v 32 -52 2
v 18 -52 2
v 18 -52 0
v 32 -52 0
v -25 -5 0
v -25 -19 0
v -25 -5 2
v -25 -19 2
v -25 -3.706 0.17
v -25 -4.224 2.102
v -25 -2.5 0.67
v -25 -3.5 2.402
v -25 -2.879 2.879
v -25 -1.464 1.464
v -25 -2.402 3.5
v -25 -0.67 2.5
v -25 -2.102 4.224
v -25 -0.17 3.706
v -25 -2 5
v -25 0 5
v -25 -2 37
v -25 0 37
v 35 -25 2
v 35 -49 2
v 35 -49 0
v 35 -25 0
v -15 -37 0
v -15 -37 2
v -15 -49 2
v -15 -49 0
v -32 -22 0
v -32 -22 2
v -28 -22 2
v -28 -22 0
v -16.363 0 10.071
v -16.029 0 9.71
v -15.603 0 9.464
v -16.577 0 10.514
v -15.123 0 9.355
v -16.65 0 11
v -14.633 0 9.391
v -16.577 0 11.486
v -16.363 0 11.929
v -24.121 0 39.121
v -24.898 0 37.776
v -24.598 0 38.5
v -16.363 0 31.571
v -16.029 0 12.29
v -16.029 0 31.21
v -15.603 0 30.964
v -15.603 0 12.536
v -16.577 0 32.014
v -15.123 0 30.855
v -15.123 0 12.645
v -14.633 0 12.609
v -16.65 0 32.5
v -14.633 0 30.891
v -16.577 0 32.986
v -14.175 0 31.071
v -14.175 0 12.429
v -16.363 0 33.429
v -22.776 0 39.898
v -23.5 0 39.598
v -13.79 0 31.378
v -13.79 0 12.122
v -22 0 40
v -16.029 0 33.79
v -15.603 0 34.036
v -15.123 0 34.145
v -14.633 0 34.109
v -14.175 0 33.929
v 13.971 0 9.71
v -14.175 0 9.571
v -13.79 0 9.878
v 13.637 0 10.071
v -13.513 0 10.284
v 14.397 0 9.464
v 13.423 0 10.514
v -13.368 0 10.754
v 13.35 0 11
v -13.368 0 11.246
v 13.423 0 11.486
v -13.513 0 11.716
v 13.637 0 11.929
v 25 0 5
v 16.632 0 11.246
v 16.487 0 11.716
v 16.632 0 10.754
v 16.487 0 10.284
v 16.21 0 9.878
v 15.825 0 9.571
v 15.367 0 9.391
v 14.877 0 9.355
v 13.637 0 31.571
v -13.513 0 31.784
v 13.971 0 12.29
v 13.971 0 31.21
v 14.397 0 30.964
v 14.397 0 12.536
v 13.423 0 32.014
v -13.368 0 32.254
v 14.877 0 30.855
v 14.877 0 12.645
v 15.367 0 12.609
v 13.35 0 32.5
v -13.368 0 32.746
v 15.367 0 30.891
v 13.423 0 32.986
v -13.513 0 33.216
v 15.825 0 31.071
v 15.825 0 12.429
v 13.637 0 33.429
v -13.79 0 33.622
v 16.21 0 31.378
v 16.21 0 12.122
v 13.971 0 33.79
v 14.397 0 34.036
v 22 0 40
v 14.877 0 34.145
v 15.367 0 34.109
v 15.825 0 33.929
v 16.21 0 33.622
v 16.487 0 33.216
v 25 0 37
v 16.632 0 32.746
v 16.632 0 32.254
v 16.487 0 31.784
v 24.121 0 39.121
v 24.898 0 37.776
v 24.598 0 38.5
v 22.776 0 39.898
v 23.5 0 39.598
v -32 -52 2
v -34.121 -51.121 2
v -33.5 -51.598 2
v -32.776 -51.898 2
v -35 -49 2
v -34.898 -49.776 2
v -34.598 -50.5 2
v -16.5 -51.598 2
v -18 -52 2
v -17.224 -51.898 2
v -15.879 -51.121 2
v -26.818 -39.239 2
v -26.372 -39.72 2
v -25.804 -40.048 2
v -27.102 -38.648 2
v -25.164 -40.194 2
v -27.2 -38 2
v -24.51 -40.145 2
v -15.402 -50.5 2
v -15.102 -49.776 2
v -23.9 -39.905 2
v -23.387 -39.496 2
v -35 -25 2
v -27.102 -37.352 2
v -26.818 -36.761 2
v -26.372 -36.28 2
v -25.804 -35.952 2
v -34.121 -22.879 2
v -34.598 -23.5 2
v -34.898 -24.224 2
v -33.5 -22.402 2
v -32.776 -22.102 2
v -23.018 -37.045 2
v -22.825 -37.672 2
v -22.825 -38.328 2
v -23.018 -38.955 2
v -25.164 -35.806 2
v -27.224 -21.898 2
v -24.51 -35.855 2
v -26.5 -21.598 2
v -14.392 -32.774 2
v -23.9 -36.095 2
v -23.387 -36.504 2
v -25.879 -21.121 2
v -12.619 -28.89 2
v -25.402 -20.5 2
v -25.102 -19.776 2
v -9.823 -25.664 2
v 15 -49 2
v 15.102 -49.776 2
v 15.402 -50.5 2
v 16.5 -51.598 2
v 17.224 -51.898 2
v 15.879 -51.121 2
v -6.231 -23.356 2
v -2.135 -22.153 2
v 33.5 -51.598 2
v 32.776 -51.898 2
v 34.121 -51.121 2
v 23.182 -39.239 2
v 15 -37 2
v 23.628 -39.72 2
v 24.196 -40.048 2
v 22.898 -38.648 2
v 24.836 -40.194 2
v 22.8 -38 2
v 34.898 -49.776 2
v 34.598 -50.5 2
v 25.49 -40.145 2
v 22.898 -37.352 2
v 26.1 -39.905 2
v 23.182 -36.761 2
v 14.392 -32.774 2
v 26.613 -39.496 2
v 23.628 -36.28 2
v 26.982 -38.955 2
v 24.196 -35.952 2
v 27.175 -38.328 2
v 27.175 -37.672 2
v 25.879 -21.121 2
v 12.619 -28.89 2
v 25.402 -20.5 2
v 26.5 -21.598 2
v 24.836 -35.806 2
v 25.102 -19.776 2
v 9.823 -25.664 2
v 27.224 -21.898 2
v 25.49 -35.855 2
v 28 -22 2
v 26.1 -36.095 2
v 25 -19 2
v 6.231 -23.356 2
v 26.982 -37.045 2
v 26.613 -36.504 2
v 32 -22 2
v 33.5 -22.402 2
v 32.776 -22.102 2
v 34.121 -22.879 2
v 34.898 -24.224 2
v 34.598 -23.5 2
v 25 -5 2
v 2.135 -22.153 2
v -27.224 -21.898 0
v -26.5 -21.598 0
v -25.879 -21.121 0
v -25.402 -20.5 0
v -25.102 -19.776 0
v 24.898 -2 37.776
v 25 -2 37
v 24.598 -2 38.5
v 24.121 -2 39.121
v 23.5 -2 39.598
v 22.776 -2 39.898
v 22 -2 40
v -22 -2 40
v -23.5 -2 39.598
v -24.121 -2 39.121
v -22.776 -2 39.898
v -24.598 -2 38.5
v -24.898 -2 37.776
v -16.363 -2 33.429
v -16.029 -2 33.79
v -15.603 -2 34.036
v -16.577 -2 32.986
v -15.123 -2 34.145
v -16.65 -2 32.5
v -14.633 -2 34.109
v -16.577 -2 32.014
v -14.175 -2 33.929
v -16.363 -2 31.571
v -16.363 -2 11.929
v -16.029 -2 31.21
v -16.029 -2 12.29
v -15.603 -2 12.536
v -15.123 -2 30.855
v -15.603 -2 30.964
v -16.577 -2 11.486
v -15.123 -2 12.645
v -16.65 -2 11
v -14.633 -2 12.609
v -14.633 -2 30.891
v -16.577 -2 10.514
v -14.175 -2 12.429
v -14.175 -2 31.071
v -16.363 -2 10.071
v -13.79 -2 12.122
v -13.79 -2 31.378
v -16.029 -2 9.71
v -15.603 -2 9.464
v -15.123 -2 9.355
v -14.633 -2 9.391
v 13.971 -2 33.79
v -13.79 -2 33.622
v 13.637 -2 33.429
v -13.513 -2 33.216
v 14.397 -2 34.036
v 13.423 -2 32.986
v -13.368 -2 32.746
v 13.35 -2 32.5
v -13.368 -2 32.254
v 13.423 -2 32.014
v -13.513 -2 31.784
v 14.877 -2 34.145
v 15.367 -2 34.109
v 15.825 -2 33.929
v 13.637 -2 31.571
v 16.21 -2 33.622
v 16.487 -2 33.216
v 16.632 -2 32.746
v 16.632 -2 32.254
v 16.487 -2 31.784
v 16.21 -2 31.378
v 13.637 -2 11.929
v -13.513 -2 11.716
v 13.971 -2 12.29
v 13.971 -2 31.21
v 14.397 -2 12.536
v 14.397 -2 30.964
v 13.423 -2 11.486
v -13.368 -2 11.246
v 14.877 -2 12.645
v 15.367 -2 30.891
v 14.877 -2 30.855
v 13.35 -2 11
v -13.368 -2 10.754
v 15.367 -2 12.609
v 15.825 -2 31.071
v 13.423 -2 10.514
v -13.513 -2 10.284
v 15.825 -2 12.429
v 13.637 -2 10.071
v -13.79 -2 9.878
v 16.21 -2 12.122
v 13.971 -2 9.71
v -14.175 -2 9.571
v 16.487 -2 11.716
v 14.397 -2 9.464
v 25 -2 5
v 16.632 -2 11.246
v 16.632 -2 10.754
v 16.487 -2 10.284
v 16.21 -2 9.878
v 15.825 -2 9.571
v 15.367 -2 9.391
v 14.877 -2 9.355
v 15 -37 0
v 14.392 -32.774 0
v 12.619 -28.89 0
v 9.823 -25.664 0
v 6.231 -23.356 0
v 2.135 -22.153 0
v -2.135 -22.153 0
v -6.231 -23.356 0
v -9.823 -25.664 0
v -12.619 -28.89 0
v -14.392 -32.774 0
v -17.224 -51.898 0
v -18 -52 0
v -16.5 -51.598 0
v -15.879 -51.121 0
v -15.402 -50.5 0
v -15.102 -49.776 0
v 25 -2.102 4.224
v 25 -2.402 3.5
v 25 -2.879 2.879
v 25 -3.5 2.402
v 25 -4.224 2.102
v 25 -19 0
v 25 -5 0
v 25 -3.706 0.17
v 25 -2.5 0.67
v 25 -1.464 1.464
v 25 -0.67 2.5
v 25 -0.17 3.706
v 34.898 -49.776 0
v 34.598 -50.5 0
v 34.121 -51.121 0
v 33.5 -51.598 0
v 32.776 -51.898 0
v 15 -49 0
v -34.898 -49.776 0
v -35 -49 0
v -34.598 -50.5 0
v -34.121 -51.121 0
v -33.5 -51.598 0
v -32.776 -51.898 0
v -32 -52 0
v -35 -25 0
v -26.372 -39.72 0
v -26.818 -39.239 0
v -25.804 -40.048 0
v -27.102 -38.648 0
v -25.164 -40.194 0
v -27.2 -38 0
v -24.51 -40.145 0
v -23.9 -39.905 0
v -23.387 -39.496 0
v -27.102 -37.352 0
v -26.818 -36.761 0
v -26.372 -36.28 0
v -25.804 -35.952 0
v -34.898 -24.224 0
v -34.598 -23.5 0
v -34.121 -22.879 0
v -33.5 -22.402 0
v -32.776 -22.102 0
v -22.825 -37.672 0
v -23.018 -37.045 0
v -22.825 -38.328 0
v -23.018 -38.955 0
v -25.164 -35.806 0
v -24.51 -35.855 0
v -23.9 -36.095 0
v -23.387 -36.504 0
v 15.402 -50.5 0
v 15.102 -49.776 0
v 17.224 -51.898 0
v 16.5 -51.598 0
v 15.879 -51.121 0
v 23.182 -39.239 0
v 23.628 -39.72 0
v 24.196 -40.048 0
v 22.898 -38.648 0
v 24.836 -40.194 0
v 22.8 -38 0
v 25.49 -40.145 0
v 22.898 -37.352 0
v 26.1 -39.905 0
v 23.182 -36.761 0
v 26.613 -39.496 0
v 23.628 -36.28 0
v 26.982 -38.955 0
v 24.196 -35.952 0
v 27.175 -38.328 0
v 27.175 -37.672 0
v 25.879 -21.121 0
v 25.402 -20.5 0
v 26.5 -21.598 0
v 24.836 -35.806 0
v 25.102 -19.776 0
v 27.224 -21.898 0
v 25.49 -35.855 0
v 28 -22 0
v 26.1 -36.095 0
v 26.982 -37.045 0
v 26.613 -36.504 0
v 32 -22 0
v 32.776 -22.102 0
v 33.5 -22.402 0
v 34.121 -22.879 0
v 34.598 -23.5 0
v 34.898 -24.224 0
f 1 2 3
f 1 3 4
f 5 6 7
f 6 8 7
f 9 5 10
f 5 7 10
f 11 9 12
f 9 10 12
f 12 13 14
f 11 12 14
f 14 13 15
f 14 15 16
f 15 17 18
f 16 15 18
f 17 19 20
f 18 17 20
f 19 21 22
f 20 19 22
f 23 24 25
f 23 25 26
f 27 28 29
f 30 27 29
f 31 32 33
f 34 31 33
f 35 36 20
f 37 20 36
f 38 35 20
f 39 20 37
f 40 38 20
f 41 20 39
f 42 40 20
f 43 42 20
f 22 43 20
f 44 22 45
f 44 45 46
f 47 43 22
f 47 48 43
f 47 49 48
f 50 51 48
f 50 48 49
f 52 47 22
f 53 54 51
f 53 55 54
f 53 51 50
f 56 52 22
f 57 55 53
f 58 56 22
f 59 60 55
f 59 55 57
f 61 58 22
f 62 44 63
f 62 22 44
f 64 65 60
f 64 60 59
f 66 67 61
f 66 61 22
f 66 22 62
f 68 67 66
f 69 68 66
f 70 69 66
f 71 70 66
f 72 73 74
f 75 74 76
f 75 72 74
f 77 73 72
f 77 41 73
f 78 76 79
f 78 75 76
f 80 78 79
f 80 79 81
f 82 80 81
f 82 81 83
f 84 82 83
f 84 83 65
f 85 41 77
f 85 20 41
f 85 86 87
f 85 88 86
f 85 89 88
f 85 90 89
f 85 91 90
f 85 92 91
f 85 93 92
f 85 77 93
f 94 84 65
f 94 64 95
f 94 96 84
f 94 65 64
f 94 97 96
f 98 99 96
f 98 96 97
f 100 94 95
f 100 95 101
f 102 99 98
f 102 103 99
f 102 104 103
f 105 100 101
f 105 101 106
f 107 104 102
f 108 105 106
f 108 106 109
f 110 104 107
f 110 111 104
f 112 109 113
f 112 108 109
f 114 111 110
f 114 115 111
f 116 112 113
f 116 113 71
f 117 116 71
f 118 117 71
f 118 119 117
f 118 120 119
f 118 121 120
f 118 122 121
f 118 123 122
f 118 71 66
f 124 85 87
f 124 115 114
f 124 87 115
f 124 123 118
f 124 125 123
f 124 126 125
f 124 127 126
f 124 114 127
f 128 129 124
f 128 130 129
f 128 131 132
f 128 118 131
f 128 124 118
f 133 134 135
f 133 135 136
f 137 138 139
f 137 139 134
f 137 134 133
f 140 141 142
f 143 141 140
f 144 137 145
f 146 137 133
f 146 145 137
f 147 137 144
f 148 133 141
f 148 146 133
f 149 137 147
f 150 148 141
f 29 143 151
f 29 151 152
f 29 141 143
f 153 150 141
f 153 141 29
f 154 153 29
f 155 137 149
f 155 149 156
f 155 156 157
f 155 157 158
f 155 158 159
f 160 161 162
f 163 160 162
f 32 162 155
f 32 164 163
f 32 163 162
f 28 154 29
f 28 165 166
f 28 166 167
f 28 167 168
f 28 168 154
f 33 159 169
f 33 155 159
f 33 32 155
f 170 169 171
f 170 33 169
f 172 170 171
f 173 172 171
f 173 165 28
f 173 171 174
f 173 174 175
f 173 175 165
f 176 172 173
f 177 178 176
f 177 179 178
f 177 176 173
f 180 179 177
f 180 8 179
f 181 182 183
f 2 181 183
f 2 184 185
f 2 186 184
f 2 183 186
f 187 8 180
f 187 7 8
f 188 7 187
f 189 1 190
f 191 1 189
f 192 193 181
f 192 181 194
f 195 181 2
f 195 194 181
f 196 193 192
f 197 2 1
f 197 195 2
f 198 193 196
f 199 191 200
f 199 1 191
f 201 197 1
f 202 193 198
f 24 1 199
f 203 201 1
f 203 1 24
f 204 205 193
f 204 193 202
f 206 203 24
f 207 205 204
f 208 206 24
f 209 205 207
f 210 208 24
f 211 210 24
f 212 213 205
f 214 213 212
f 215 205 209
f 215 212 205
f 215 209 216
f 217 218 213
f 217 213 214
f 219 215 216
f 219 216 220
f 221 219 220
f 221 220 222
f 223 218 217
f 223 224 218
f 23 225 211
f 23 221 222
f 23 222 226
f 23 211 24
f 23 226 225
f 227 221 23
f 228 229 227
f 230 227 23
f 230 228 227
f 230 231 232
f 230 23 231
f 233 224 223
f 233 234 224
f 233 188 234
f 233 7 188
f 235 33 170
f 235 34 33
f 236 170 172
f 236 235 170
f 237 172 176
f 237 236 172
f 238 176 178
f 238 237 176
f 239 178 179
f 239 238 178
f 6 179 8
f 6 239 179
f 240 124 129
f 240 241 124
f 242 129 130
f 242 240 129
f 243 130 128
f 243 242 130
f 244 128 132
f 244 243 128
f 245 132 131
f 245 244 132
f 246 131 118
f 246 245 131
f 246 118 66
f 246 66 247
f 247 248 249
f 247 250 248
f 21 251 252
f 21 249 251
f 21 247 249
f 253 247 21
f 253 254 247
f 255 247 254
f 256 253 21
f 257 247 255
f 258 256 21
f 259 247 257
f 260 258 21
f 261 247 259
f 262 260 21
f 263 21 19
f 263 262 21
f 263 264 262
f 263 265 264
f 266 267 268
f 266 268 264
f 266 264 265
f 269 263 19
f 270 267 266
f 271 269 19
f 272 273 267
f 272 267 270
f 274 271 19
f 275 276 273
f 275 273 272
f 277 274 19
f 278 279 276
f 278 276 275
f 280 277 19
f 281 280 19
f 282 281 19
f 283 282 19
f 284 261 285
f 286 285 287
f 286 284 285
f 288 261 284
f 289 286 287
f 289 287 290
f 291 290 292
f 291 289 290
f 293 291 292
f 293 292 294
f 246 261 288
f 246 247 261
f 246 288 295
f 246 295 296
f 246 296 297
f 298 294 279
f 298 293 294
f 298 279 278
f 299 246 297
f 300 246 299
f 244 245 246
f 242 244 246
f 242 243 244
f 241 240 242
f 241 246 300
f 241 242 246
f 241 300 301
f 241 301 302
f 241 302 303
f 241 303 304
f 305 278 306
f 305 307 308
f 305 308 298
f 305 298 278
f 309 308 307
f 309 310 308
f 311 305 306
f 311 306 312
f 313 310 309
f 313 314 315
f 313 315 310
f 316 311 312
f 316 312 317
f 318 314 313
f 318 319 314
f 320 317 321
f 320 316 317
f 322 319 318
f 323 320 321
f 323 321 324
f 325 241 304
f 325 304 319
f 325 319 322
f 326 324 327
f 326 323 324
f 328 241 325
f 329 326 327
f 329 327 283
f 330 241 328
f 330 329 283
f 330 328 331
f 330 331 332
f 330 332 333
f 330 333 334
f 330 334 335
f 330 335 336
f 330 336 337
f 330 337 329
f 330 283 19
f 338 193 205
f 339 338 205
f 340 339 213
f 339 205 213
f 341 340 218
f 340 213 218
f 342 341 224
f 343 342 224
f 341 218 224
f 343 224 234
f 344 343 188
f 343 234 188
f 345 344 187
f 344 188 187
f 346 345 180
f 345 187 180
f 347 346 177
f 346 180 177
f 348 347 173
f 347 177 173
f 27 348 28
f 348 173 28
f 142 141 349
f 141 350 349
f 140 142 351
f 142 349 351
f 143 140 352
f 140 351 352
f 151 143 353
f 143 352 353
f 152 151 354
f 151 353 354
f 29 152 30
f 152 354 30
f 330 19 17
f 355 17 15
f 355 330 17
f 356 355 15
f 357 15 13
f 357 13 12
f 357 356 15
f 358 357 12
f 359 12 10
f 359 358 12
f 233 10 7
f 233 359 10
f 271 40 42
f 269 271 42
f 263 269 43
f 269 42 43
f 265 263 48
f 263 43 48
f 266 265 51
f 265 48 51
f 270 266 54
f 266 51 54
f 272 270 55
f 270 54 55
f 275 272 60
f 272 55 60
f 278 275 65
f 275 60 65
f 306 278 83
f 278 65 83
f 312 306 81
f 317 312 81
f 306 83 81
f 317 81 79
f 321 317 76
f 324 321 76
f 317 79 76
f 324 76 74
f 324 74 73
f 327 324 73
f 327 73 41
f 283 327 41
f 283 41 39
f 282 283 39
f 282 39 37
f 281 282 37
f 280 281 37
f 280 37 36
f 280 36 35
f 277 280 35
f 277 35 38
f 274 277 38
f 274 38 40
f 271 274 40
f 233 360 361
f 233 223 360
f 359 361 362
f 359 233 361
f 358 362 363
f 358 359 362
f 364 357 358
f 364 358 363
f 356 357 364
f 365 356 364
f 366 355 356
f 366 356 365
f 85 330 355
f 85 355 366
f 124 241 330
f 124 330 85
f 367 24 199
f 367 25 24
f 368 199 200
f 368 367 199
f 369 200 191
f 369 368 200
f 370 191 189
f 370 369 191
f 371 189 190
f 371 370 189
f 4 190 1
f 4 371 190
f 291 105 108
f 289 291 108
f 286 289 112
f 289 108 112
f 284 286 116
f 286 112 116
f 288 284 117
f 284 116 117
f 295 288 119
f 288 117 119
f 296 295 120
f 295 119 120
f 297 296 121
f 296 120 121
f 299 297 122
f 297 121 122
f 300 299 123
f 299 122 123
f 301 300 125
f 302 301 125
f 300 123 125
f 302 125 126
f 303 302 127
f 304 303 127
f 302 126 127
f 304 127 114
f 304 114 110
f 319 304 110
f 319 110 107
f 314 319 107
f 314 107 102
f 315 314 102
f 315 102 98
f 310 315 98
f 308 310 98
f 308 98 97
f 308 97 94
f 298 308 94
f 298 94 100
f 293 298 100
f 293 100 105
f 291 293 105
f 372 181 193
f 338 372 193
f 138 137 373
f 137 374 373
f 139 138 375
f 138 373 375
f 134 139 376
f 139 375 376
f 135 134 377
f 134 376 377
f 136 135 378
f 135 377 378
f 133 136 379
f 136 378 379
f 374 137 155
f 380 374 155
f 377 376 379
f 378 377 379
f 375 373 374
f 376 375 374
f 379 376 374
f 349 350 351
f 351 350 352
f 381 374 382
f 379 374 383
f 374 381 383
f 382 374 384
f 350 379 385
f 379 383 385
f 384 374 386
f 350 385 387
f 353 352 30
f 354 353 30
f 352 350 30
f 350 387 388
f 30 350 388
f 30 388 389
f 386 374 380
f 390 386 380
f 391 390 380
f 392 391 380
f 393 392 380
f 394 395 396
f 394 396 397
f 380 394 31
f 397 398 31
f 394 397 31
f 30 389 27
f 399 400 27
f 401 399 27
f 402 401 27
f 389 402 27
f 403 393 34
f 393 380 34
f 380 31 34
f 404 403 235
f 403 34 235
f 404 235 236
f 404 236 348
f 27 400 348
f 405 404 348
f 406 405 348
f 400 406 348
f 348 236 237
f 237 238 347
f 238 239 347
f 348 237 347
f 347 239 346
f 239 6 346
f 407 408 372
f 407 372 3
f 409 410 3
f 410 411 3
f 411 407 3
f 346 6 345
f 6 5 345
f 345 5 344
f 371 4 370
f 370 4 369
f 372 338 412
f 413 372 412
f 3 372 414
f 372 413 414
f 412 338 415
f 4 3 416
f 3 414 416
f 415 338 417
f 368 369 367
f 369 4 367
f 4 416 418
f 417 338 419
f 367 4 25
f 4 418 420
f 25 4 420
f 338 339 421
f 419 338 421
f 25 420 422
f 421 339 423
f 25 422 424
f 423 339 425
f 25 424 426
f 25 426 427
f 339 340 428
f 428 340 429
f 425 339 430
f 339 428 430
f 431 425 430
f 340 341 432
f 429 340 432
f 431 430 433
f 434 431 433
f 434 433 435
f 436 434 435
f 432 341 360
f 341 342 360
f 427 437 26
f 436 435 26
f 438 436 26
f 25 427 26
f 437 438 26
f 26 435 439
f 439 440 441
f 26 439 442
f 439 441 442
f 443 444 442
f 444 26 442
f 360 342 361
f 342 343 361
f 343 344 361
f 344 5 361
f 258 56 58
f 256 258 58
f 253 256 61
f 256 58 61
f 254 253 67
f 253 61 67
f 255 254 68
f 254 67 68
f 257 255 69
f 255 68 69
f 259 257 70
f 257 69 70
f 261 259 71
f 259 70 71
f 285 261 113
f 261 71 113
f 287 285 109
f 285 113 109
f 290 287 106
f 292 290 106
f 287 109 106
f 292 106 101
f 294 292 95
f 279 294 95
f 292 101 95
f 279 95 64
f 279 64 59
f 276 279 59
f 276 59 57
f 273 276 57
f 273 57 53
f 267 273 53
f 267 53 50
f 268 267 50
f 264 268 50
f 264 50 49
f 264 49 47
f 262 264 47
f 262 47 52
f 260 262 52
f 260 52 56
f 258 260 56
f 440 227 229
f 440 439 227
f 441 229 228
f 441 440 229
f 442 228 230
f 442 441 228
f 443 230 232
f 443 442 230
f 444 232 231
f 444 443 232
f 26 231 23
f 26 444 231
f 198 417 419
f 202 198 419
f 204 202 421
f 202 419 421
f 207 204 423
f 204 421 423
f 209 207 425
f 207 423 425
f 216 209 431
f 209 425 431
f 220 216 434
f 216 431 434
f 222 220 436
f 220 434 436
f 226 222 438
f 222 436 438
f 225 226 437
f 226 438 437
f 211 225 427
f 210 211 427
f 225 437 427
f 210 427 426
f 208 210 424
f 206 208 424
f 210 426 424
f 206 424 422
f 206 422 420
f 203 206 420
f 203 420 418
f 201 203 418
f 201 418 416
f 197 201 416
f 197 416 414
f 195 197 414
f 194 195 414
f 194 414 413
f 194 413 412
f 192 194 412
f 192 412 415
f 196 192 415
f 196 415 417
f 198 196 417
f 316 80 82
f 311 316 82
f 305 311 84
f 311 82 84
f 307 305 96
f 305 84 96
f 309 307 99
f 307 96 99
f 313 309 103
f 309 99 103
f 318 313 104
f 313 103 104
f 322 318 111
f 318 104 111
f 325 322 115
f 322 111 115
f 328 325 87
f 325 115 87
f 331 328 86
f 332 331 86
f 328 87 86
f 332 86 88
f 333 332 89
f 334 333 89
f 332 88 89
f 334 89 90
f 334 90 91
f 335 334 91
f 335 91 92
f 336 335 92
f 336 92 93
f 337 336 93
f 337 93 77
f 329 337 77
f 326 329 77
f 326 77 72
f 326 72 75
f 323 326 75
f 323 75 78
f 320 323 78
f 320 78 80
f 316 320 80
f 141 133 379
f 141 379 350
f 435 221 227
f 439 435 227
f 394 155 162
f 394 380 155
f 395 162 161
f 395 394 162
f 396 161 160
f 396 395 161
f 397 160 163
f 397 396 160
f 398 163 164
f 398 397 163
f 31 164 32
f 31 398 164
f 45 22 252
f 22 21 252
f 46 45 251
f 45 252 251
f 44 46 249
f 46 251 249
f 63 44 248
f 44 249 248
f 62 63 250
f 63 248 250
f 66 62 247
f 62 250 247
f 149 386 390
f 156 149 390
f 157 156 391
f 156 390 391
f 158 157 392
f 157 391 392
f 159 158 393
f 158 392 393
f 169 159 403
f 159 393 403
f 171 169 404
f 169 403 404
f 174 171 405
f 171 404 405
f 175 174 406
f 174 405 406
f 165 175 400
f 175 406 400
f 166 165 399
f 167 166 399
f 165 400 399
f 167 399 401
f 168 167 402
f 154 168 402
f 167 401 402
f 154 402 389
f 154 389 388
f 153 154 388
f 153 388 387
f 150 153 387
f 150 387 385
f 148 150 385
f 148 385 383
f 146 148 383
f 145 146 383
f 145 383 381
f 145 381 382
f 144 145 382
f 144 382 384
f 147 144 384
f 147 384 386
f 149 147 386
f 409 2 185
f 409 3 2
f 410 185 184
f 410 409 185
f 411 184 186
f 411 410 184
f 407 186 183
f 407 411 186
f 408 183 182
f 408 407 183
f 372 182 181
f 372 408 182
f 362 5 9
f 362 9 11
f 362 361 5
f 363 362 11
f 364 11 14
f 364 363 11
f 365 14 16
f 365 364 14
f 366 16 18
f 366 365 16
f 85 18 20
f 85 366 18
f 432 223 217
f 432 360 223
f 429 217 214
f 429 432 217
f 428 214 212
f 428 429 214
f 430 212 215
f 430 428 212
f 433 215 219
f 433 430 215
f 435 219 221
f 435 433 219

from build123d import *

# Parameters (mm, degrees)
F1_DEPTH = 25
F3_D     = 3.3
F4_W     = 10
F4_H     = 30
F5_DEPTH = 2
F6_D     = 4.4
F7_DEPTH = 2
F8_R     = 3


with BuildPart() as f1:
    # F0 (on Right) → F1 (new body, symmetric)
    with BuildSketch(Plane.YZ):
        with BuildLine():
            ThreePointArc((-5, 0), (-1.4644660941, 1.4644660941), (0, 5))
            Line((0, 5), (0, 40))
            Line((0, 40), (-2, 40))
            Line((-2, 40), (-2, 5))
            ThreePointArc((-2, 5), (-2.8786796564, 2.8786796564), (-5, 2))
            Line((-5, 2), (-52, 2))
            Line((-52, 2), (-52, 0))
            Line((-52, 0), (-5, 0))
        make_face()
    extrude(amount=F1_DEPTH, both=True)

    # F3 (through all)
    with Locations(Plane.XZ.offset(2)):
        with Locations((-15, 32.5), (-15, 11), (15, 11), (15, 32.5)):
            Hole(F3_D / 2)

    # F4 (on face) → F5 (join, through all)
    with BuildSketch(Plane.XY.offset(2)):
        with Locations((-30, -37)):
            Rectangle(F4_W, F4_H)
        with Locations((30, -37)):
            Rectangle(F4_W, F4_H)
    extrude(amount=-F5_DEPTH)

    # F6 (through all)
    with Locations(Plane.XY.offset(2)):
        with Locations((-25, -38), (25, -38)):
            Hole(F6_D / 2)

    # F4 (on face) → F7 (cut, through all)
    with BuildSketch(Plane.XY.offset(2)):
        with BuildLine():
            ThreePointArc((15, -37), (0, -22), (-15, -37))
            ThreePointArc((-15, -37), (-10.6066017178, -47.6066017178), (0, -52))
            ThreePointArc((0, -52), (10.6066017178, -47.6066017178), (15, -37))
        make_face()
        with BuildLine():
            Line((-15, -37), (-15, -52))
            Line((-15, -52), (0, -52))
            ThreePointArc((0, -52), (-10.6066017178, -47.6066017178), (-15, -37))
        make_face()
        with BuildLine():
            ThreePointArc((15, -37), (10.6066017178, -47.6066017178), (0, -52))
            Line((0, -52), (15, -52))
            Line((15, -52), (15, -37))
        make_face()
    extrude(amount=-F7_DEPTH, mode=Mode.SUBTRACT)

    # F8
    f8_edges = [f1.edges().sort_by_distance(p)[0] for p in [
        (-15, -52, 1),
        (-35, -52, 1),
        (-35, -22, 1),
        (-25, -22, 1),
        (-25, -1, 40),
        (15, -52, 1),
        (35, -52, 1),
        (35, -22, 1),
        (25, -22, 1),
        (25, -1, 40),
    ]]
    fillet(f8_edges, radius=F8_R)


solid = f1.part
